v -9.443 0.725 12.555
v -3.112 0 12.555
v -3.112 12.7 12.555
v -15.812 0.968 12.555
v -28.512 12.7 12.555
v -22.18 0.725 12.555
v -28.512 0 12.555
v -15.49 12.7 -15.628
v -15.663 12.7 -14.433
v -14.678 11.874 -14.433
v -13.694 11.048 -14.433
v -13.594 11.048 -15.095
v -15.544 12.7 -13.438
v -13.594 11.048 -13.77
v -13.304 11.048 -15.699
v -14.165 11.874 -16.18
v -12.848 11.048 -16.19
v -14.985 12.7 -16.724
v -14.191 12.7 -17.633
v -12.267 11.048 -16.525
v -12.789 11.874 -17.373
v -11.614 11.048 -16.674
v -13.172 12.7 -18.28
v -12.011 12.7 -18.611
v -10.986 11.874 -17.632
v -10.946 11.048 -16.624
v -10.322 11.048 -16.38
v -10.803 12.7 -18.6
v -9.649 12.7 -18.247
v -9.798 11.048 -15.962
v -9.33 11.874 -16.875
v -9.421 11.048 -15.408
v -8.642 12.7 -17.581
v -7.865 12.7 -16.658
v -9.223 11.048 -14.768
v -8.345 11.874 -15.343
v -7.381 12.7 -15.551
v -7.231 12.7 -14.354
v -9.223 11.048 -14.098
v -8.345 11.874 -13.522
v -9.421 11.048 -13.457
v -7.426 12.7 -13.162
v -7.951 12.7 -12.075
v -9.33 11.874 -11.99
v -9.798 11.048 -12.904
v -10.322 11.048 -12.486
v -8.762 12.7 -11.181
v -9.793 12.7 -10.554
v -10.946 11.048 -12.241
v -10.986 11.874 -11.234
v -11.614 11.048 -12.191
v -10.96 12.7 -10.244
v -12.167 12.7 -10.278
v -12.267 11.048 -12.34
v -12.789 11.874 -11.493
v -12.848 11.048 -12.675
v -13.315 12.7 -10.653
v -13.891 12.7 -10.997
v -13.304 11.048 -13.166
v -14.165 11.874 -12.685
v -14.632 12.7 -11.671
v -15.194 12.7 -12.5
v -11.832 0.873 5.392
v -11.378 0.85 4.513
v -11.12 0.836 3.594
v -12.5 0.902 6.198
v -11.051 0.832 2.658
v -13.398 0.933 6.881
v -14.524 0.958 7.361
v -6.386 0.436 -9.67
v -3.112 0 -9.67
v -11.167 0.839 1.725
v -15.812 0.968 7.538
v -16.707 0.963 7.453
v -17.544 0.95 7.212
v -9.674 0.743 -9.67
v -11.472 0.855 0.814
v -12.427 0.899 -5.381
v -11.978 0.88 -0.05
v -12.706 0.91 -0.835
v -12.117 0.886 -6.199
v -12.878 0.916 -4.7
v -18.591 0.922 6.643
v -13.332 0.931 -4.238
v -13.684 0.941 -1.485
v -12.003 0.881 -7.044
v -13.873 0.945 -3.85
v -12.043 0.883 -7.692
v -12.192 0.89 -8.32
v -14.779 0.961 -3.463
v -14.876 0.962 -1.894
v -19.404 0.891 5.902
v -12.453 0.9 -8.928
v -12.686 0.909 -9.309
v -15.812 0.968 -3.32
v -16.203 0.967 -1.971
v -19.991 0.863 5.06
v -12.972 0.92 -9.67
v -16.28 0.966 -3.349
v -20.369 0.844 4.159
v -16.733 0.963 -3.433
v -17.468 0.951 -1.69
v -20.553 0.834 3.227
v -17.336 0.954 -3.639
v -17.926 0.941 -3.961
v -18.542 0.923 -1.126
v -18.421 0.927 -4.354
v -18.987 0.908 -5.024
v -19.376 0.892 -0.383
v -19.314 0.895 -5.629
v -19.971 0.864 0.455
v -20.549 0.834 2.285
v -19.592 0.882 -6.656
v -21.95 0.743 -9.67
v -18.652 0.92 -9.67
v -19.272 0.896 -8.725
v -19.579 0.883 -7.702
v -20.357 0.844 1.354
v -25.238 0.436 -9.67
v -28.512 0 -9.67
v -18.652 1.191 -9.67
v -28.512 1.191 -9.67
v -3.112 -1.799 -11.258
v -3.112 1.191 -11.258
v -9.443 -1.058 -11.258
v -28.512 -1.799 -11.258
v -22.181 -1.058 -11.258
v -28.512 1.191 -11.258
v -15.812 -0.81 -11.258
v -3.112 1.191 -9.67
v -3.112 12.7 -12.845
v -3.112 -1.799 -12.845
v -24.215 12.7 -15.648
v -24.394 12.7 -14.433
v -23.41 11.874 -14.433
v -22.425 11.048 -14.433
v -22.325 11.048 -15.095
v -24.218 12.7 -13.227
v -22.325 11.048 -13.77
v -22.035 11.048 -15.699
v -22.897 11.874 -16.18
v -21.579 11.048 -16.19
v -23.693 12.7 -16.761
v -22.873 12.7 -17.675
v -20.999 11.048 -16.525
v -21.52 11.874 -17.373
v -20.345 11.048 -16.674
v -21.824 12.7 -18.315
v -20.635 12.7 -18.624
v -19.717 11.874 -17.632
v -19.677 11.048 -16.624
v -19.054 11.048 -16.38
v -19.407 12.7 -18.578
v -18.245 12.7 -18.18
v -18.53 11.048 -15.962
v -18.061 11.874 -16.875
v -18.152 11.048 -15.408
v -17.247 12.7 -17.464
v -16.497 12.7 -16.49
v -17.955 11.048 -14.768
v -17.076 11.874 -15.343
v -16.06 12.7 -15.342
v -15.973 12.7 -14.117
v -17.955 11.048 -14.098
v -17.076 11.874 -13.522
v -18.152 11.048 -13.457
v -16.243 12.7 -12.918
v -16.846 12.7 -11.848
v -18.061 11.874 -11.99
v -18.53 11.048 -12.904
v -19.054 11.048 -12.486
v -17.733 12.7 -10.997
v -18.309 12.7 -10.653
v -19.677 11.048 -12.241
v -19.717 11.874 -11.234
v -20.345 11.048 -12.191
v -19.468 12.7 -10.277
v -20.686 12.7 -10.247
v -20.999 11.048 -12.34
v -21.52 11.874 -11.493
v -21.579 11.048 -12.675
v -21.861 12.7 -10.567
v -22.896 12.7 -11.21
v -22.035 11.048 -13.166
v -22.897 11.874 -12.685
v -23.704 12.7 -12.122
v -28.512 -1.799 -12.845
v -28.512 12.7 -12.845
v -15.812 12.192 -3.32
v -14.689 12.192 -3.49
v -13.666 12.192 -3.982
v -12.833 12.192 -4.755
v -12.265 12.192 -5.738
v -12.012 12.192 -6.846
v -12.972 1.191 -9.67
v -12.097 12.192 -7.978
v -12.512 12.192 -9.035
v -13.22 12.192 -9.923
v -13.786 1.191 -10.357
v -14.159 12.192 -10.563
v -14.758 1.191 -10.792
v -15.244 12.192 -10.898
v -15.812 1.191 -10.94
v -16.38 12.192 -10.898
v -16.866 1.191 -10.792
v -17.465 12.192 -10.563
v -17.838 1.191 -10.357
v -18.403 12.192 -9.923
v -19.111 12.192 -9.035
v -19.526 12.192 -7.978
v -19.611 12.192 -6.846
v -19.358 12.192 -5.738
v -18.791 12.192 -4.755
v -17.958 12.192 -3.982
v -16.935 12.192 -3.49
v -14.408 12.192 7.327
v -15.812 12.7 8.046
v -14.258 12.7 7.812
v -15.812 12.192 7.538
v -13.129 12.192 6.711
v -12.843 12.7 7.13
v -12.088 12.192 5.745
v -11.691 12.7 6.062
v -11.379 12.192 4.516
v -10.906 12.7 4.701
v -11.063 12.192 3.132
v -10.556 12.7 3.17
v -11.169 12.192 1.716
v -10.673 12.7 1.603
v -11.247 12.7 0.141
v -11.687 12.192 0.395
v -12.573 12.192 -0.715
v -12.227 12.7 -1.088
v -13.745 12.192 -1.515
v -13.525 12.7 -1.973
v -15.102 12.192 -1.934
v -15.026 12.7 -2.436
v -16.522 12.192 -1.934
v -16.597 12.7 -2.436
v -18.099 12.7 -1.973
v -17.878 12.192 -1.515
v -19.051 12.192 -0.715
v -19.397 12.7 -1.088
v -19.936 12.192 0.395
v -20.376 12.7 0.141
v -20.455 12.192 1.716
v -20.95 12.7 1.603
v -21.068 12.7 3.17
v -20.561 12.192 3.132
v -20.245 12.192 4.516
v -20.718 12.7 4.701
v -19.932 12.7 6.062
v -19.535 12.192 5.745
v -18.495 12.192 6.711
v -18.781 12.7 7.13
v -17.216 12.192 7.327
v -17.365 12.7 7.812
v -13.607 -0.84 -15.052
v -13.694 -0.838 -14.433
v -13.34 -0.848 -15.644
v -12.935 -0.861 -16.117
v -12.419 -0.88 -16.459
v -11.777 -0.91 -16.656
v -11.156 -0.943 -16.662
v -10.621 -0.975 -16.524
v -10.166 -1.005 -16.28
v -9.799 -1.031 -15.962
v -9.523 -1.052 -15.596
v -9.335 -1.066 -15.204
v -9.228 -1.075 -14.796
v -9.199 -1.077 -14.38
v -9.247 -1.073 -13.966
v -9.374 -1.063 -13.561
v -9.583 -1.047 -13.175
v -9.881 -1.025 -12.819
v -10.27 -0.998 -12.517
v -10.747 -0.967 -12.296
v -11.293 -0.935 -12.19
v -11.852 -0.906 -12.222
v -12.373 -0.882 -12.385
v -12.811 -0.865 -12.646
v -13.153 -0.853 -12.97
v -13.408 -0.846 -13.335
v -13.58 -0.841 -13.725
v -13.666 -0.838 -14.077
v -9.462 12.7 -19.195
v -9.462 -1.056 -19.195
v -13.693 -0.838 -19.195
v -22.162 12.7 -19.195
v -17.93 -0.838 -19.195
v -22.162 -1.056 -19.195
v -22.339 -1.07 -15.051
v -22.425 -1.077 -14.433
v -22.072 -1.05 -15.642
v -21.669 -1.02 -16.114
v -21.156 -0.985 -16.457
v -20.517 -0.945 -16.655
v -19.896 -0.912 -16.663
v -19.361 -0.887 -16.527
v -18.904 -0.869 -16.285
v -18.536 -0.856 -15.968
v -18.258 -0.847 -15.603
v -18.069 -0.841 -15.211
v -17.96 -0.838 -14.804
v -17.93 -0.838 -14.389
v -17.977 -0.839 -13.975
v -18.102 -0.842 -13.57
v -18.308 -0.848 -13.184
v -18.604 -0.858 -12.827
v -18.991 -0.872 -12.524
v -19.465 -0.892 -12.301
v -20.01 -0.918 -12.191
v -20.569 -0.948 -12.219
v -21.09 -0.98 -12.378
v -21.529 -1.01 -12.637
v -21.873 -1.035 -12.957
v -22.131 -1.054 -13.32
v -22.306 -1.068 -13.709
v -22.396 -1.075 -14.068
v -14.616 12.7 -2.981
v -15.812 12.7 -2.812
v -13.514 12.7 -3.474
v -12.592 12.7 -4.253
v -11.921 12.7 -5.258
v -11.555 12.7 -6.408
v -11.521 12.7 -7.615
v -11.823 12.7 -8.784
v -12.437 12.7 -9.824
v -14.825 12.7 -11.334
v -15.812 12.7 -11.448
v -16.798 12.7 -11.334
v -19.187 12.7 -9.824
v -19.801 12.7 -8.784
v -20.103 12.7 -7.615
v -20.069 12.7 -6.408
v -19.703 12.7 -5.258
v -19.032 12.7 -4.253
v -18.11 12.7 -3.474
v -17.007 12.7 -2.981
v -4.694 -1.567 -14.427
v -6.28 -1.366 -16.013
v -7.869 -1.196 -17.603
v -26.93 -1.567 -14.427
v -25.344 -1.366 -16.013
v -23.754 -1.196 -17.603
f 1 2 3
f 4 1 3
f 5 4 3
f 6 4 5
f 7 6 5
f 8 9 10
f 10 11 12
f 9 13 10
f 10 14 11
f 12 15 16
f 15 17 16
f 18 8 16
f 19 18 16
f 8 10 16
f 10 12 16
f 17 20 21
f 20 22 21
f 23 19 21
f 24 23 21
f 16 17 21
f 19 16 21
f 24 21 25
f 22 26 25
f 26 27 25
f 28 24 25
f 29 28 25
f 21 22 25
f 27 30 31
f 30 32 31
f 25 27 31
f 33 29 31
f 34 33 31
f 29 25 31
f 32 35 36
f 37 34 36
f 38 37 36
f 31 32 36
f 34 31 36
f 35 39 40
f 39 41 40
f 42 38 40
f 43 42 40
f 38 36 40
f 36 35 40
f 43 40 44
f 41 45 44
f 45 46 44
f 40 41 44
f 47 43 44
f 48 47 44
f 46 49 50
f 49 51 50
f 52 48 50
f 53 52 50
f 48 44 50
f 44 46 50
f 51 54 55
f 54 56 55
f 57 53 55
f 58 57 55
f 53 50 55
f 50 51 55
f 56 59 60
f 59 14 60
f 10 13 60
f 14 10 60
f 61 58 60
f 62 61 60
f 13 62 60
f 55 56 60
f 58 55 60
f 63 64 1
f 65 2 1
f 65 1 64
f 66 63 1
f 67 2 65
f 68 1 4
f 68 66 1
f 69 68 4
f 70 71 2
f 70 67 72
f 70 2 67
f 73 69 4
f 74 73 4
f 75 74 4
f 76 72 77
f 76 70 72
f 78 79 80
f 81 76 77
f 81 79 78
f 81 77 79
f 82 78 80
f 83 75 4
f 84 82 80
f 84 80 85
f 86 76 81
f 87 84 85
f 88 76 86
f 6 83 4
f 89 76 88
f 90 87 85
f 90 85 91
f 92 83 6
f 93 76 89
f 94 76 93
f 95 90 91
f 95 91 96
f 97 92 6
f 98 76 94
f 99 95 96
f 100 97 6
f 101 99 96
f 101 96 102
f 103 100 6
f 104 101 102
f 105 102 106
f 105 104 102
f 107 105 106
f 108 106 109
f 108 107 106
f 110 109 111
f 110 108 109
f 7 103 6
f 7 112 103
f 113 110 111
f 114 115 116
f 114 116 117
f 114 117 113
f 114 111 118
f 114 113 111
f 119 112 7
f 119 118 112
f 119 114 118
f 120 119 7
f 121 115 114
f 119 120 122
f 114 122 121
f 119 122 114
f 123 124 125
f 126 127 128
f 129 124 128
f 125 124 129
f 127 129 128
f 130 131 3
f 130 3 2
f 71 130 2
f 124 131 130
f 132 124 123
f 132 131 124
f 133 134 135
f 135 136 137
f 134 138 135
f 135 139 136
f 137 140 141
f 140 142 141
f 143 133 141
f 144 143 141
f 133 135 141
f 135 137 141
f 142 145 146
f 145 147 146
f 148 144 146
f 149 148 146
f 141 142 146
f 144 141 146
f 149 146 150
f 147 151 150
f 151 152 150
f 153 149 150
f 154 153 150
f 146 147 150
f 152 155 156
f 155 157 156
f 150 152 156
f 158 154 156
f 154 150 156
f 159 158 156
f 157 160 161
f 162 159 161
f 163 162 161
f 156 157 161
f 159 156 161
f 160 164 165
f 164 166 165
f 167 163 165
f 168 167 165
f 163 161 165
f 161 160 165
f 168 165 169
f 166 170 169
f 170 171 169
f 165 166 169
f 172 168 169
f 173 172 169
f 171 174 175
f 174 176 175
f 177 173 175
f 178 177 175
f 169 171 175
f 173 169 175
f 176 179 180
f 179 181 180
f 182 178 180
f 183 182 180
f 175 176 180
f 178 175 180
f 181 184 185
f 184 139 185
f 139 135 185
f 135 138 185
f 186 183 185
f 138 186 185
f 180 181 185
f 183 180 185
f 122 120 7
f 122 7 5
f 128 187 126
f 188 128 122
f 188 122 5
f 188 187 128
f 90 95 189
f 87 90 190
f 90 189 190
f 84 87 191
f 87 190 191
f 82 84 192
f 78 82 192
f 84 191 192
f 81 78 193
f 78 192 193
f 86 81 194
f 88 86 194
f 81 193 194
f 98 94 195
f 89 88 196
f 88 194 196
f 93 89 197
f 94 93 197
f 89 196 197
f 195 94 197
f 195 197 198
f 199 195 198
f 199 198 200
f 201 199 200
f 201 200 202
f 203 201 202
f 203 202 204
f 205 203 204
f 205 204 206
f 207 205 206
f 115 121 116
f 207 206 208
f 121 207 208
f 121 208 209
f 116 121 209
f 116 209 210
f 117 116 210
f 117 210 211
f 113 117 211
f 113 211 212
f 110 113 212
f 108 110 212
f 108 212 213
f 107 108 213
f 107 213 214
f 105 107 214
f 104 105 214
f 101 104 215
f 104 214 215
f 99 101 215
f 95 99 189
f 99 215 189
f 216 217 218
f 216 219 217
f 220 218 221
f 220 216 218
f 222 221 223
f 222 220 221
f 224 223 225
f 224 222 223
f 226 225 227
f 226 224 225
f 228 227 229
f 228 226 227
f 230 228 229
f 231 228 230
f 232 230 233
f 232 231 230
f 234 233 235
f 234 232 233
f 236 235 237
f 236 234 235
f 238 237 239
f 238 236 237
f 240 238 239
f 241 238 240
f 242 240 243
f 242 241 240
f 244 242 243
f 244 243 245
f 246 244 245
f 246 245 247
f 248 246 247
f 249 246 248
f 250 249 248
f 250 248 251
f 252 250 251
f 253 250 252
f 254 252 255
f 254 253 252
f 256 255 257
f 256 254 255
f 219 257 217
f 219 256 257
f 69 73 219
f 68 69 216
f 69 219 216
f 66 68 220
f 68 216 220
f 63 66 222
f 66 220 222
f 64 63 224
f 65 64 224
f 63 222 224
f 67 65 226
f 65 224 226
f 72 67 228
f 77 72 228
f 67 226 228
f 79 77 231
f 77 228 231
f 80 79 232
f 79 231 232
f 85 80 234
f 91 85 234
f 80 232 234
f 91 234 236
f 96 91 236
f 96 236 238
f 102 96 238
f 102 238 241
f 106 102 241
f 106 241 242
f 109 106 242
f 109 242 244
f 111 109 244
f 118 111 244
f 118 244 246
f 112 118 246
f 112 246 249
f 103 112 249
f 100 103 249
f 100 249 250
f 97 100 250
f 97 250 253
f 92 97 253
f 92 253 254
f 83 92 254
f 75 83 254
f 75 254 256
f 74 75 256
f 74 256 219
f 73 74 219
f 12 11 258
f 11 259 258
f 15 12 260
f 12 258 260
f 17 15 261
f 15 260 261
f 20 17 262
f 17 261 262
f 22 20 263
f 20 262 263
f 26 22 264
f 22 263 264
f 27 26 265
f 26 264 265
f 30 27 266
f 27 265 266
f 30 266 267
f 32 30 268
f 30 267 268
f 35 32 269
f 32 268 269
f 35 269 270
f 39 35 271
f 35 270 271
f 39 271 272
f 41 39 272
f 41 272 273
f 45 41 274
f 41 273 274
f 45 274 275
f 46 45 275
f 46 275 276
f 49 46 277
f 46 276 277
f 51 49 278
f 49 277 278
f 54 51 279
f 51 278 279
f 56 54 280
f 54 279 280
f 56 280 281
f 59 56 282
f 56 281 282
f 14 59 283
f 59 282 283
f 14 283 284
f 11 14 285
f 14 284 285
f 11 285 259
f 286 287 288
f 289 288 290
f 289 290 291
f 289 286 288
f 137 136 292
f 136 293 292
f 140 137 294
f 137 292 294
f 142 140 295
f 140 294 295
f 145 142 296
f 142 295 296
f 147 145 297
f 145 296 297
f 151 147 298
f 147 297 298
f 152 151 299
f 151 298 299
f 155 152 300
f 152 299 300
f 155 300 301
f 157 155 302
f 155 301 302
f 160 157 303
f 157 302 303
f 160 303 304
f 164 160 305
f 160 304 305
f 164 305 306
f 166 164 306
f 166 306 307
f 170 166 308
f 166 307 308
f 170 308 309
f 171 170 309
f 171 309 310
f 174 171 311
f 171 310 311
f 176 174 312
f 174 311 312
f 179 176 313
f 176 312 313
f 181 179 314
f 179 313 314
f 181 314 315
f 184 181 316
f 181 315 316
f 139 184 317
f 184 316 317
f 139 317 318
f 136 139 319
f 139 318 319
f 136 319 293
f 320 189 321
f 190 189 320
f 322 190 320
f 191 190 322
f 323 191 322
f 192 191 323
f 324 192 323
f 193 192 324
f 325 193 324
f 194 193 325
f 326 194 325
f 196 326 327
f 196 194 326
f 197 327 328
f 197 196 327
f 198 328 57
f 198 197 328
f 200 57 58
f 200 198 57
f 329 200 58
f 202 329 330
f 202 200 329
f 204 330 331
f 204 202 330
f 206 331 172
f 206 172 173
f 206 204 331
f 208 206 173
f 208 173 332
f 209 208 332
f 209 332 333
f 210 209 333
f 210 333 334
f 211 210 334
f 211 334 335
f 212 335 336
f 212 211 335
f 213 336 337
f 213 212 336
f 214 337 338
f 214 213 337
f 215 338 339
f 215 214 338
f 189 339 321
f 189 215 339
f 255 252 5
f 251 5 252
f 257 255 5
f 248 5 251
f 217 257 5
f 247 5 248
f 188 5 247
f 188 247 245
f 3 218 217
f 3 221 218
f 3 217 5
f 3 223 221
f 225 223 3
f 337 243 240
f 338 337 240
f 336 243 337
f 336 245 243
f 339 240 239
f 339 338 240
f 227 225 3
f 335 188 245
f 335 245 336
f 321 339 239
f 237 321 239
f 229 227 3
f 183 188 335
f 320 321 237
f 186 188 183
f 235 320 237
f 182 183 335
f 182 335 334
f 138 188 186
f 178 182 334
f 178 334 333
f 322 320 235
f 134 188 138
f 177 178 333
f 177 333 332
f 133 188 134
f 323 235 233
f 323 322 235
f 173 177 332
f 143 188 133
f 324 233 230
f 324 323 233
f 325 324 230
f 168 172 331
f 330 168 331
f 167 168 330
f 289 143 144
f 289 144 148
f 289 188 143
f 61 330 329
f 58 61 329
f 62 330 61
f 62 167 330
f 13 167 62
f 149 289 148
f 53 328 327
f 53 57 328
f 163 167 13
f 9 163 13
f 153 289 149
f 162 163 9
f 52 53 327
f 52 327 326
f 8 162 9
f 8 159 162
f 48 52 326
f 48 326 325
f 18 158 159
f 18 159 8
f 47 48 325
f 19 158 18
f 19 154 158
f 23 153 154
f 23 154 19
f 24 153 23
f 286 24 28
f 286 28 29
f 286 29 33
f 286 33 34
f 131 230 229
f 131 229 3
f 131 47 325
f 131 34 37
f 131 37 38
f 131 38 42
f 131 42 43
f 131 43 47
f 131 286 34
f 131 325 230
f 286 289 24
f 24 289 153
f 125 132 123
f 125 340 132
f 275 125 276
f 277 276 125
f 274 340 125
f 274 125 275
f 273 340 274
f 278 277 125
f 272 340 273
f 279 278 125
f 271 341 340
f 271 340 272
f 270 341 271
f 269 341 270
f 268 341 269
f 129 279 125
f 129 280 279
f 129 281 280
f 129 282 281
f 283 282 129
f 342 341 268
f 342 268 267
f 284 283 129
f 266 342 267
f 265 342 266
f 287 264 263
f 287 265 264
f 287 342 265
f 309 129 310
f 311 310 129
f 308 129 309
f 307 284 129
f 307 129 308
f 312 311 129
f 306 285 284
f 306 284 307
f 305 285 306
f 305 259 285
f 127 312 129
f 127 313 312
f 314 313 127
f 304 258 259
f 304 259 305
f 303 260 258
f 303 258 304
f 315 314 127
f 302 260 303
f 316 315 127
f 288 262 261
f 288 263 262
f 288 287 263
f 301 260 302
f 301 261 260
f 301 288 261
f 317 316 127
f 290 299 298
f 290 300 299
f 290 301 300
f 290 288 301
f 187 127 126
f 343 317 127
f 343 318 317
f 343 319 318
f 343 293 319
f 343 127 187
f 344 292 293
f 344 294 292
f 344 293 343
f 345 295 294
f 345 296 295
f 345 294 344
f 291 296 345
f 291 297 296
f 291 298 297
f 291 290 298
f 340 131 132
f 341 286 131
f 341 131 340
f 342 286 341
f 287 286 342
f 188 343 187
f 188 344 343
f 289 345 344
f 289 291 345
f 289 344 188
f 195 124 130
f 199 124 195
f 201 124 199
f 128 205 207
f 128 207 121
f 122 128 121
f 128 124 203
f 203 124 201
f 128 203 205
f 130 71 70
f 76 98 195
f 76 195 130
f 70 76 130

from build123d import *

# Parameters (mm, degrees)
BOSS_EXTRUDE1_DEPTH                               = 12.7
CUT_EXTRUDE1_DEPTH                                = 45.522766139
CUT_EXTRUDE1_DEPTH_BACK                           = 45.522766139
SKETCH2_R                                         = 83.82
BOSS_EXTRUDE2_DEPTH                               = 7.9375
CHAMFER1_SIZE                                     = 6.35
CSK_FOR_8_FLAT_HEAD_MACHINE_SCREW_100_D           = 4.4958
CSK_FOR_8_FLAT_HEAD_MACHINE_SCREW_100_CSINK_D     = 8.4328
CSK_FOR_8_FLAT_HEAD_MACHINE_SCREW_100_CSINK_ANGLE = 100
SKETCH6_R                                         = 1.631947848
SKETCH6_R_2                                       = 1.523937663
CUT_EXTRUDE2_DEPTH                                = 38.304291688
SKETCH7_W                                         = 1.5875
SKETCH7_H                                         = 1.190625
CUT_EXTRUDE3_DEPTH                                = 35.276937503
SKETCH8_R                                         = 4.7625
SKETCH8_R_2                                       = 3.81
CUT_EXTRUDE4_DEPTH                                = 38.304291688
CHAMFER2_SIZE                                     = 0.508


with BuildPart() as part:
    # Sketch1 → Boss-Extrude1 (new body)
    with BuildSketch(Plane(origin=(0, 0, 0), x_dir=(1, 0, 0), z_dir=(0, 1, 0))):
        Polygon((-28.511825699, 12.845271113), (-22.161825699, 19.195271113), (-9.461825699, 19.195271113), (-3.111825699, 12.845271113), (-3.111825699, -12.554728887), (-28.511825699, -12.554728887), align=None)
    extrude(amount=BOSS_EXTRUDE1_DEPTH)

    # Sketch2 → Cut-Extrude1 (cut, two sides: drawn at the far end of the back side and taken through both)
    with BuildSketch(Plane.XY.offset(12.554728887).offset(-CUT_EXTRUDE1_DEPTH_BACK)):
        with Locations((-15.811825699, -82.852292666)):
            Circle(SKETCH2_R)
    extrude(amount=CUT_EXTRUDE1_DEPTH + CUT_EXTRUDE1_DEPTH_BACK, mode=Mode.SUBTRACT)

    # Sketch5 → Boss-Extrude2 (add)
    with BuildSketch(Plane(origin=(0, 0, -19.195271113), x_dir=(-1, 0, 0), z_dir=(0, 0, -1))):
        with BuildLine():
            Line((3.111825699, 12.7), (3.111825699, 0))
            Line((3.111825699, 0), (3.111825699, -1.799225087))
            ThreePointArc((3.111825699, -1.799225087), (15.811825699, -0.810292666), (28.511825699, -1.799225087))
            Line((28.511825699, -1.799225087), (28.511825699, 0))
            Line((28.511825699, 0), (28.511825699, 12.7))
            Line((28.511825699, 12.7), (3.111825699, 12.7))
        make_face()
    extrude(amount=-BOSS_EXTRUDE2_DEPTH)

    # Chamfer1
    chamfer1_edges = [part.edges().sort_by_distance(p)[0] for p in [
        (-3.111825699, 5.450387457, -19.195271113),
        (-28.511825699, 5.450387457, -19.195271113),
    ]]
    chamfer(chamfer1_edges, length=CHAMFER1_SIZE)

    # CSK for #8 Flat Head Machine Screw (100)1 (through all)
    with Locations(Plane(origin=(0, 12.7, 0), x_dir=(1, 0, 0), z_dir=(0, 1, 0))):
        with Locations((-20.177450699, 14.432771113), (-11.446200699, 14.432771113)):
            CounterSinkHole(CSK_FOR_8_FLAT_HEAD_MACHINE_SCREW_100_D / 2, CSK_FOR_8_FLAT_HEAD_MACHINE_SCREW_100_CSINK_D / 2, counter_sink_angle=CSK_FOR_8_FLAT_HEAD_MACHINE_SCREW_100_CSINK_ANGLE)

    # Sketch6 → Cut-Extrude2 (cut, through all)
    with BuildSketch(Plane(origin=(0, 12.7, 0), x_dir=(1, 0, 0), z_dir=(0, 1, 0))):
        with Locations(Location((-15.811825699, 7.130260145, 0), (0, 0, 270))):
            Circle(SKETCH6_R)
        with Locations(Location((-15.811825699, -2.775791253, 0), (0, 0, 270))):
            Circle(SKETCH6_R_2)
    extrude(amount=-CUT_EXTRUDE2_DEPTH, mode=Mode.SUBTRACT)

    # Sketch7 → Cut-Extrude3 (cut, through all)
    with BuildSketch(Plane.ZY.offset(28.511825699)):
        with Locations((-10.464021113, 0.5953125)):
            Rectangle(SKETCH7_W, SKETCH7_H)
    extrude(amount=-CUT_EXTRUDE3_DEPTH, mode=Mode.SUBTRACT)

    # Sketch8 → Cut-Extrude4 (cut, through all)
    with BuildSketch(Plane(origin=(0, 12.7, 0), x_dir=(1, 0, 0), z_dir=(0, 1, 0))):
        with Locations(Location((-15.811825699, -2.775791253, 0), (0, 0, 270))):
            Circle(SKETCH8_R)
        with Locations(Location((-15.811825699, 7.130260145, 0), (0, 0, 270))):
            Circle(SKETCH8_R_2)
    extrude(amount=-CUT_EXTRUDE4_DEPTH, mode=Mode.SUBTRACT)

    # Chamfer2
    # the kernel refuses this chamfer: 0.508 mm, written as the material it takes off along each edge
    with BuildSketch(Plane(origin=(-15.811825699, 12.7, 2.775791253), x_dir=(0, 0, 1), z_dir=(-1, 0, 0))) as chamfer2_piece_1:
        Polygon((4.7625 + CHAMFER2_SIZE, 0), (4.7625, -CHAMFER2_SIZE), (4.7625, 0), align=None)
    revolve(axis=Axis((-15.811825699, 12.7, 2.775791253), (0, 1, 0)), mode=Mode.SUBTRACT)
    with BuildSketch(Plane(origin=(-15.811825699, 12.7, -7.130260145), x_dir=(0, 0, 1), z_dir=(-1, 0, 0))) as chamfer2_piece_2:
        Polygon((3.81 + CHAMFER2_SIZE, 0), (3.81, -CHAMFER2_SIZE), (3.81, 0), align=None)
    revolve(axis=Axis((-15.811825699, 12.7, -7.130260145), (0, 1, 0)), mode=Mode.SUBTRACT)


solid = part.part
